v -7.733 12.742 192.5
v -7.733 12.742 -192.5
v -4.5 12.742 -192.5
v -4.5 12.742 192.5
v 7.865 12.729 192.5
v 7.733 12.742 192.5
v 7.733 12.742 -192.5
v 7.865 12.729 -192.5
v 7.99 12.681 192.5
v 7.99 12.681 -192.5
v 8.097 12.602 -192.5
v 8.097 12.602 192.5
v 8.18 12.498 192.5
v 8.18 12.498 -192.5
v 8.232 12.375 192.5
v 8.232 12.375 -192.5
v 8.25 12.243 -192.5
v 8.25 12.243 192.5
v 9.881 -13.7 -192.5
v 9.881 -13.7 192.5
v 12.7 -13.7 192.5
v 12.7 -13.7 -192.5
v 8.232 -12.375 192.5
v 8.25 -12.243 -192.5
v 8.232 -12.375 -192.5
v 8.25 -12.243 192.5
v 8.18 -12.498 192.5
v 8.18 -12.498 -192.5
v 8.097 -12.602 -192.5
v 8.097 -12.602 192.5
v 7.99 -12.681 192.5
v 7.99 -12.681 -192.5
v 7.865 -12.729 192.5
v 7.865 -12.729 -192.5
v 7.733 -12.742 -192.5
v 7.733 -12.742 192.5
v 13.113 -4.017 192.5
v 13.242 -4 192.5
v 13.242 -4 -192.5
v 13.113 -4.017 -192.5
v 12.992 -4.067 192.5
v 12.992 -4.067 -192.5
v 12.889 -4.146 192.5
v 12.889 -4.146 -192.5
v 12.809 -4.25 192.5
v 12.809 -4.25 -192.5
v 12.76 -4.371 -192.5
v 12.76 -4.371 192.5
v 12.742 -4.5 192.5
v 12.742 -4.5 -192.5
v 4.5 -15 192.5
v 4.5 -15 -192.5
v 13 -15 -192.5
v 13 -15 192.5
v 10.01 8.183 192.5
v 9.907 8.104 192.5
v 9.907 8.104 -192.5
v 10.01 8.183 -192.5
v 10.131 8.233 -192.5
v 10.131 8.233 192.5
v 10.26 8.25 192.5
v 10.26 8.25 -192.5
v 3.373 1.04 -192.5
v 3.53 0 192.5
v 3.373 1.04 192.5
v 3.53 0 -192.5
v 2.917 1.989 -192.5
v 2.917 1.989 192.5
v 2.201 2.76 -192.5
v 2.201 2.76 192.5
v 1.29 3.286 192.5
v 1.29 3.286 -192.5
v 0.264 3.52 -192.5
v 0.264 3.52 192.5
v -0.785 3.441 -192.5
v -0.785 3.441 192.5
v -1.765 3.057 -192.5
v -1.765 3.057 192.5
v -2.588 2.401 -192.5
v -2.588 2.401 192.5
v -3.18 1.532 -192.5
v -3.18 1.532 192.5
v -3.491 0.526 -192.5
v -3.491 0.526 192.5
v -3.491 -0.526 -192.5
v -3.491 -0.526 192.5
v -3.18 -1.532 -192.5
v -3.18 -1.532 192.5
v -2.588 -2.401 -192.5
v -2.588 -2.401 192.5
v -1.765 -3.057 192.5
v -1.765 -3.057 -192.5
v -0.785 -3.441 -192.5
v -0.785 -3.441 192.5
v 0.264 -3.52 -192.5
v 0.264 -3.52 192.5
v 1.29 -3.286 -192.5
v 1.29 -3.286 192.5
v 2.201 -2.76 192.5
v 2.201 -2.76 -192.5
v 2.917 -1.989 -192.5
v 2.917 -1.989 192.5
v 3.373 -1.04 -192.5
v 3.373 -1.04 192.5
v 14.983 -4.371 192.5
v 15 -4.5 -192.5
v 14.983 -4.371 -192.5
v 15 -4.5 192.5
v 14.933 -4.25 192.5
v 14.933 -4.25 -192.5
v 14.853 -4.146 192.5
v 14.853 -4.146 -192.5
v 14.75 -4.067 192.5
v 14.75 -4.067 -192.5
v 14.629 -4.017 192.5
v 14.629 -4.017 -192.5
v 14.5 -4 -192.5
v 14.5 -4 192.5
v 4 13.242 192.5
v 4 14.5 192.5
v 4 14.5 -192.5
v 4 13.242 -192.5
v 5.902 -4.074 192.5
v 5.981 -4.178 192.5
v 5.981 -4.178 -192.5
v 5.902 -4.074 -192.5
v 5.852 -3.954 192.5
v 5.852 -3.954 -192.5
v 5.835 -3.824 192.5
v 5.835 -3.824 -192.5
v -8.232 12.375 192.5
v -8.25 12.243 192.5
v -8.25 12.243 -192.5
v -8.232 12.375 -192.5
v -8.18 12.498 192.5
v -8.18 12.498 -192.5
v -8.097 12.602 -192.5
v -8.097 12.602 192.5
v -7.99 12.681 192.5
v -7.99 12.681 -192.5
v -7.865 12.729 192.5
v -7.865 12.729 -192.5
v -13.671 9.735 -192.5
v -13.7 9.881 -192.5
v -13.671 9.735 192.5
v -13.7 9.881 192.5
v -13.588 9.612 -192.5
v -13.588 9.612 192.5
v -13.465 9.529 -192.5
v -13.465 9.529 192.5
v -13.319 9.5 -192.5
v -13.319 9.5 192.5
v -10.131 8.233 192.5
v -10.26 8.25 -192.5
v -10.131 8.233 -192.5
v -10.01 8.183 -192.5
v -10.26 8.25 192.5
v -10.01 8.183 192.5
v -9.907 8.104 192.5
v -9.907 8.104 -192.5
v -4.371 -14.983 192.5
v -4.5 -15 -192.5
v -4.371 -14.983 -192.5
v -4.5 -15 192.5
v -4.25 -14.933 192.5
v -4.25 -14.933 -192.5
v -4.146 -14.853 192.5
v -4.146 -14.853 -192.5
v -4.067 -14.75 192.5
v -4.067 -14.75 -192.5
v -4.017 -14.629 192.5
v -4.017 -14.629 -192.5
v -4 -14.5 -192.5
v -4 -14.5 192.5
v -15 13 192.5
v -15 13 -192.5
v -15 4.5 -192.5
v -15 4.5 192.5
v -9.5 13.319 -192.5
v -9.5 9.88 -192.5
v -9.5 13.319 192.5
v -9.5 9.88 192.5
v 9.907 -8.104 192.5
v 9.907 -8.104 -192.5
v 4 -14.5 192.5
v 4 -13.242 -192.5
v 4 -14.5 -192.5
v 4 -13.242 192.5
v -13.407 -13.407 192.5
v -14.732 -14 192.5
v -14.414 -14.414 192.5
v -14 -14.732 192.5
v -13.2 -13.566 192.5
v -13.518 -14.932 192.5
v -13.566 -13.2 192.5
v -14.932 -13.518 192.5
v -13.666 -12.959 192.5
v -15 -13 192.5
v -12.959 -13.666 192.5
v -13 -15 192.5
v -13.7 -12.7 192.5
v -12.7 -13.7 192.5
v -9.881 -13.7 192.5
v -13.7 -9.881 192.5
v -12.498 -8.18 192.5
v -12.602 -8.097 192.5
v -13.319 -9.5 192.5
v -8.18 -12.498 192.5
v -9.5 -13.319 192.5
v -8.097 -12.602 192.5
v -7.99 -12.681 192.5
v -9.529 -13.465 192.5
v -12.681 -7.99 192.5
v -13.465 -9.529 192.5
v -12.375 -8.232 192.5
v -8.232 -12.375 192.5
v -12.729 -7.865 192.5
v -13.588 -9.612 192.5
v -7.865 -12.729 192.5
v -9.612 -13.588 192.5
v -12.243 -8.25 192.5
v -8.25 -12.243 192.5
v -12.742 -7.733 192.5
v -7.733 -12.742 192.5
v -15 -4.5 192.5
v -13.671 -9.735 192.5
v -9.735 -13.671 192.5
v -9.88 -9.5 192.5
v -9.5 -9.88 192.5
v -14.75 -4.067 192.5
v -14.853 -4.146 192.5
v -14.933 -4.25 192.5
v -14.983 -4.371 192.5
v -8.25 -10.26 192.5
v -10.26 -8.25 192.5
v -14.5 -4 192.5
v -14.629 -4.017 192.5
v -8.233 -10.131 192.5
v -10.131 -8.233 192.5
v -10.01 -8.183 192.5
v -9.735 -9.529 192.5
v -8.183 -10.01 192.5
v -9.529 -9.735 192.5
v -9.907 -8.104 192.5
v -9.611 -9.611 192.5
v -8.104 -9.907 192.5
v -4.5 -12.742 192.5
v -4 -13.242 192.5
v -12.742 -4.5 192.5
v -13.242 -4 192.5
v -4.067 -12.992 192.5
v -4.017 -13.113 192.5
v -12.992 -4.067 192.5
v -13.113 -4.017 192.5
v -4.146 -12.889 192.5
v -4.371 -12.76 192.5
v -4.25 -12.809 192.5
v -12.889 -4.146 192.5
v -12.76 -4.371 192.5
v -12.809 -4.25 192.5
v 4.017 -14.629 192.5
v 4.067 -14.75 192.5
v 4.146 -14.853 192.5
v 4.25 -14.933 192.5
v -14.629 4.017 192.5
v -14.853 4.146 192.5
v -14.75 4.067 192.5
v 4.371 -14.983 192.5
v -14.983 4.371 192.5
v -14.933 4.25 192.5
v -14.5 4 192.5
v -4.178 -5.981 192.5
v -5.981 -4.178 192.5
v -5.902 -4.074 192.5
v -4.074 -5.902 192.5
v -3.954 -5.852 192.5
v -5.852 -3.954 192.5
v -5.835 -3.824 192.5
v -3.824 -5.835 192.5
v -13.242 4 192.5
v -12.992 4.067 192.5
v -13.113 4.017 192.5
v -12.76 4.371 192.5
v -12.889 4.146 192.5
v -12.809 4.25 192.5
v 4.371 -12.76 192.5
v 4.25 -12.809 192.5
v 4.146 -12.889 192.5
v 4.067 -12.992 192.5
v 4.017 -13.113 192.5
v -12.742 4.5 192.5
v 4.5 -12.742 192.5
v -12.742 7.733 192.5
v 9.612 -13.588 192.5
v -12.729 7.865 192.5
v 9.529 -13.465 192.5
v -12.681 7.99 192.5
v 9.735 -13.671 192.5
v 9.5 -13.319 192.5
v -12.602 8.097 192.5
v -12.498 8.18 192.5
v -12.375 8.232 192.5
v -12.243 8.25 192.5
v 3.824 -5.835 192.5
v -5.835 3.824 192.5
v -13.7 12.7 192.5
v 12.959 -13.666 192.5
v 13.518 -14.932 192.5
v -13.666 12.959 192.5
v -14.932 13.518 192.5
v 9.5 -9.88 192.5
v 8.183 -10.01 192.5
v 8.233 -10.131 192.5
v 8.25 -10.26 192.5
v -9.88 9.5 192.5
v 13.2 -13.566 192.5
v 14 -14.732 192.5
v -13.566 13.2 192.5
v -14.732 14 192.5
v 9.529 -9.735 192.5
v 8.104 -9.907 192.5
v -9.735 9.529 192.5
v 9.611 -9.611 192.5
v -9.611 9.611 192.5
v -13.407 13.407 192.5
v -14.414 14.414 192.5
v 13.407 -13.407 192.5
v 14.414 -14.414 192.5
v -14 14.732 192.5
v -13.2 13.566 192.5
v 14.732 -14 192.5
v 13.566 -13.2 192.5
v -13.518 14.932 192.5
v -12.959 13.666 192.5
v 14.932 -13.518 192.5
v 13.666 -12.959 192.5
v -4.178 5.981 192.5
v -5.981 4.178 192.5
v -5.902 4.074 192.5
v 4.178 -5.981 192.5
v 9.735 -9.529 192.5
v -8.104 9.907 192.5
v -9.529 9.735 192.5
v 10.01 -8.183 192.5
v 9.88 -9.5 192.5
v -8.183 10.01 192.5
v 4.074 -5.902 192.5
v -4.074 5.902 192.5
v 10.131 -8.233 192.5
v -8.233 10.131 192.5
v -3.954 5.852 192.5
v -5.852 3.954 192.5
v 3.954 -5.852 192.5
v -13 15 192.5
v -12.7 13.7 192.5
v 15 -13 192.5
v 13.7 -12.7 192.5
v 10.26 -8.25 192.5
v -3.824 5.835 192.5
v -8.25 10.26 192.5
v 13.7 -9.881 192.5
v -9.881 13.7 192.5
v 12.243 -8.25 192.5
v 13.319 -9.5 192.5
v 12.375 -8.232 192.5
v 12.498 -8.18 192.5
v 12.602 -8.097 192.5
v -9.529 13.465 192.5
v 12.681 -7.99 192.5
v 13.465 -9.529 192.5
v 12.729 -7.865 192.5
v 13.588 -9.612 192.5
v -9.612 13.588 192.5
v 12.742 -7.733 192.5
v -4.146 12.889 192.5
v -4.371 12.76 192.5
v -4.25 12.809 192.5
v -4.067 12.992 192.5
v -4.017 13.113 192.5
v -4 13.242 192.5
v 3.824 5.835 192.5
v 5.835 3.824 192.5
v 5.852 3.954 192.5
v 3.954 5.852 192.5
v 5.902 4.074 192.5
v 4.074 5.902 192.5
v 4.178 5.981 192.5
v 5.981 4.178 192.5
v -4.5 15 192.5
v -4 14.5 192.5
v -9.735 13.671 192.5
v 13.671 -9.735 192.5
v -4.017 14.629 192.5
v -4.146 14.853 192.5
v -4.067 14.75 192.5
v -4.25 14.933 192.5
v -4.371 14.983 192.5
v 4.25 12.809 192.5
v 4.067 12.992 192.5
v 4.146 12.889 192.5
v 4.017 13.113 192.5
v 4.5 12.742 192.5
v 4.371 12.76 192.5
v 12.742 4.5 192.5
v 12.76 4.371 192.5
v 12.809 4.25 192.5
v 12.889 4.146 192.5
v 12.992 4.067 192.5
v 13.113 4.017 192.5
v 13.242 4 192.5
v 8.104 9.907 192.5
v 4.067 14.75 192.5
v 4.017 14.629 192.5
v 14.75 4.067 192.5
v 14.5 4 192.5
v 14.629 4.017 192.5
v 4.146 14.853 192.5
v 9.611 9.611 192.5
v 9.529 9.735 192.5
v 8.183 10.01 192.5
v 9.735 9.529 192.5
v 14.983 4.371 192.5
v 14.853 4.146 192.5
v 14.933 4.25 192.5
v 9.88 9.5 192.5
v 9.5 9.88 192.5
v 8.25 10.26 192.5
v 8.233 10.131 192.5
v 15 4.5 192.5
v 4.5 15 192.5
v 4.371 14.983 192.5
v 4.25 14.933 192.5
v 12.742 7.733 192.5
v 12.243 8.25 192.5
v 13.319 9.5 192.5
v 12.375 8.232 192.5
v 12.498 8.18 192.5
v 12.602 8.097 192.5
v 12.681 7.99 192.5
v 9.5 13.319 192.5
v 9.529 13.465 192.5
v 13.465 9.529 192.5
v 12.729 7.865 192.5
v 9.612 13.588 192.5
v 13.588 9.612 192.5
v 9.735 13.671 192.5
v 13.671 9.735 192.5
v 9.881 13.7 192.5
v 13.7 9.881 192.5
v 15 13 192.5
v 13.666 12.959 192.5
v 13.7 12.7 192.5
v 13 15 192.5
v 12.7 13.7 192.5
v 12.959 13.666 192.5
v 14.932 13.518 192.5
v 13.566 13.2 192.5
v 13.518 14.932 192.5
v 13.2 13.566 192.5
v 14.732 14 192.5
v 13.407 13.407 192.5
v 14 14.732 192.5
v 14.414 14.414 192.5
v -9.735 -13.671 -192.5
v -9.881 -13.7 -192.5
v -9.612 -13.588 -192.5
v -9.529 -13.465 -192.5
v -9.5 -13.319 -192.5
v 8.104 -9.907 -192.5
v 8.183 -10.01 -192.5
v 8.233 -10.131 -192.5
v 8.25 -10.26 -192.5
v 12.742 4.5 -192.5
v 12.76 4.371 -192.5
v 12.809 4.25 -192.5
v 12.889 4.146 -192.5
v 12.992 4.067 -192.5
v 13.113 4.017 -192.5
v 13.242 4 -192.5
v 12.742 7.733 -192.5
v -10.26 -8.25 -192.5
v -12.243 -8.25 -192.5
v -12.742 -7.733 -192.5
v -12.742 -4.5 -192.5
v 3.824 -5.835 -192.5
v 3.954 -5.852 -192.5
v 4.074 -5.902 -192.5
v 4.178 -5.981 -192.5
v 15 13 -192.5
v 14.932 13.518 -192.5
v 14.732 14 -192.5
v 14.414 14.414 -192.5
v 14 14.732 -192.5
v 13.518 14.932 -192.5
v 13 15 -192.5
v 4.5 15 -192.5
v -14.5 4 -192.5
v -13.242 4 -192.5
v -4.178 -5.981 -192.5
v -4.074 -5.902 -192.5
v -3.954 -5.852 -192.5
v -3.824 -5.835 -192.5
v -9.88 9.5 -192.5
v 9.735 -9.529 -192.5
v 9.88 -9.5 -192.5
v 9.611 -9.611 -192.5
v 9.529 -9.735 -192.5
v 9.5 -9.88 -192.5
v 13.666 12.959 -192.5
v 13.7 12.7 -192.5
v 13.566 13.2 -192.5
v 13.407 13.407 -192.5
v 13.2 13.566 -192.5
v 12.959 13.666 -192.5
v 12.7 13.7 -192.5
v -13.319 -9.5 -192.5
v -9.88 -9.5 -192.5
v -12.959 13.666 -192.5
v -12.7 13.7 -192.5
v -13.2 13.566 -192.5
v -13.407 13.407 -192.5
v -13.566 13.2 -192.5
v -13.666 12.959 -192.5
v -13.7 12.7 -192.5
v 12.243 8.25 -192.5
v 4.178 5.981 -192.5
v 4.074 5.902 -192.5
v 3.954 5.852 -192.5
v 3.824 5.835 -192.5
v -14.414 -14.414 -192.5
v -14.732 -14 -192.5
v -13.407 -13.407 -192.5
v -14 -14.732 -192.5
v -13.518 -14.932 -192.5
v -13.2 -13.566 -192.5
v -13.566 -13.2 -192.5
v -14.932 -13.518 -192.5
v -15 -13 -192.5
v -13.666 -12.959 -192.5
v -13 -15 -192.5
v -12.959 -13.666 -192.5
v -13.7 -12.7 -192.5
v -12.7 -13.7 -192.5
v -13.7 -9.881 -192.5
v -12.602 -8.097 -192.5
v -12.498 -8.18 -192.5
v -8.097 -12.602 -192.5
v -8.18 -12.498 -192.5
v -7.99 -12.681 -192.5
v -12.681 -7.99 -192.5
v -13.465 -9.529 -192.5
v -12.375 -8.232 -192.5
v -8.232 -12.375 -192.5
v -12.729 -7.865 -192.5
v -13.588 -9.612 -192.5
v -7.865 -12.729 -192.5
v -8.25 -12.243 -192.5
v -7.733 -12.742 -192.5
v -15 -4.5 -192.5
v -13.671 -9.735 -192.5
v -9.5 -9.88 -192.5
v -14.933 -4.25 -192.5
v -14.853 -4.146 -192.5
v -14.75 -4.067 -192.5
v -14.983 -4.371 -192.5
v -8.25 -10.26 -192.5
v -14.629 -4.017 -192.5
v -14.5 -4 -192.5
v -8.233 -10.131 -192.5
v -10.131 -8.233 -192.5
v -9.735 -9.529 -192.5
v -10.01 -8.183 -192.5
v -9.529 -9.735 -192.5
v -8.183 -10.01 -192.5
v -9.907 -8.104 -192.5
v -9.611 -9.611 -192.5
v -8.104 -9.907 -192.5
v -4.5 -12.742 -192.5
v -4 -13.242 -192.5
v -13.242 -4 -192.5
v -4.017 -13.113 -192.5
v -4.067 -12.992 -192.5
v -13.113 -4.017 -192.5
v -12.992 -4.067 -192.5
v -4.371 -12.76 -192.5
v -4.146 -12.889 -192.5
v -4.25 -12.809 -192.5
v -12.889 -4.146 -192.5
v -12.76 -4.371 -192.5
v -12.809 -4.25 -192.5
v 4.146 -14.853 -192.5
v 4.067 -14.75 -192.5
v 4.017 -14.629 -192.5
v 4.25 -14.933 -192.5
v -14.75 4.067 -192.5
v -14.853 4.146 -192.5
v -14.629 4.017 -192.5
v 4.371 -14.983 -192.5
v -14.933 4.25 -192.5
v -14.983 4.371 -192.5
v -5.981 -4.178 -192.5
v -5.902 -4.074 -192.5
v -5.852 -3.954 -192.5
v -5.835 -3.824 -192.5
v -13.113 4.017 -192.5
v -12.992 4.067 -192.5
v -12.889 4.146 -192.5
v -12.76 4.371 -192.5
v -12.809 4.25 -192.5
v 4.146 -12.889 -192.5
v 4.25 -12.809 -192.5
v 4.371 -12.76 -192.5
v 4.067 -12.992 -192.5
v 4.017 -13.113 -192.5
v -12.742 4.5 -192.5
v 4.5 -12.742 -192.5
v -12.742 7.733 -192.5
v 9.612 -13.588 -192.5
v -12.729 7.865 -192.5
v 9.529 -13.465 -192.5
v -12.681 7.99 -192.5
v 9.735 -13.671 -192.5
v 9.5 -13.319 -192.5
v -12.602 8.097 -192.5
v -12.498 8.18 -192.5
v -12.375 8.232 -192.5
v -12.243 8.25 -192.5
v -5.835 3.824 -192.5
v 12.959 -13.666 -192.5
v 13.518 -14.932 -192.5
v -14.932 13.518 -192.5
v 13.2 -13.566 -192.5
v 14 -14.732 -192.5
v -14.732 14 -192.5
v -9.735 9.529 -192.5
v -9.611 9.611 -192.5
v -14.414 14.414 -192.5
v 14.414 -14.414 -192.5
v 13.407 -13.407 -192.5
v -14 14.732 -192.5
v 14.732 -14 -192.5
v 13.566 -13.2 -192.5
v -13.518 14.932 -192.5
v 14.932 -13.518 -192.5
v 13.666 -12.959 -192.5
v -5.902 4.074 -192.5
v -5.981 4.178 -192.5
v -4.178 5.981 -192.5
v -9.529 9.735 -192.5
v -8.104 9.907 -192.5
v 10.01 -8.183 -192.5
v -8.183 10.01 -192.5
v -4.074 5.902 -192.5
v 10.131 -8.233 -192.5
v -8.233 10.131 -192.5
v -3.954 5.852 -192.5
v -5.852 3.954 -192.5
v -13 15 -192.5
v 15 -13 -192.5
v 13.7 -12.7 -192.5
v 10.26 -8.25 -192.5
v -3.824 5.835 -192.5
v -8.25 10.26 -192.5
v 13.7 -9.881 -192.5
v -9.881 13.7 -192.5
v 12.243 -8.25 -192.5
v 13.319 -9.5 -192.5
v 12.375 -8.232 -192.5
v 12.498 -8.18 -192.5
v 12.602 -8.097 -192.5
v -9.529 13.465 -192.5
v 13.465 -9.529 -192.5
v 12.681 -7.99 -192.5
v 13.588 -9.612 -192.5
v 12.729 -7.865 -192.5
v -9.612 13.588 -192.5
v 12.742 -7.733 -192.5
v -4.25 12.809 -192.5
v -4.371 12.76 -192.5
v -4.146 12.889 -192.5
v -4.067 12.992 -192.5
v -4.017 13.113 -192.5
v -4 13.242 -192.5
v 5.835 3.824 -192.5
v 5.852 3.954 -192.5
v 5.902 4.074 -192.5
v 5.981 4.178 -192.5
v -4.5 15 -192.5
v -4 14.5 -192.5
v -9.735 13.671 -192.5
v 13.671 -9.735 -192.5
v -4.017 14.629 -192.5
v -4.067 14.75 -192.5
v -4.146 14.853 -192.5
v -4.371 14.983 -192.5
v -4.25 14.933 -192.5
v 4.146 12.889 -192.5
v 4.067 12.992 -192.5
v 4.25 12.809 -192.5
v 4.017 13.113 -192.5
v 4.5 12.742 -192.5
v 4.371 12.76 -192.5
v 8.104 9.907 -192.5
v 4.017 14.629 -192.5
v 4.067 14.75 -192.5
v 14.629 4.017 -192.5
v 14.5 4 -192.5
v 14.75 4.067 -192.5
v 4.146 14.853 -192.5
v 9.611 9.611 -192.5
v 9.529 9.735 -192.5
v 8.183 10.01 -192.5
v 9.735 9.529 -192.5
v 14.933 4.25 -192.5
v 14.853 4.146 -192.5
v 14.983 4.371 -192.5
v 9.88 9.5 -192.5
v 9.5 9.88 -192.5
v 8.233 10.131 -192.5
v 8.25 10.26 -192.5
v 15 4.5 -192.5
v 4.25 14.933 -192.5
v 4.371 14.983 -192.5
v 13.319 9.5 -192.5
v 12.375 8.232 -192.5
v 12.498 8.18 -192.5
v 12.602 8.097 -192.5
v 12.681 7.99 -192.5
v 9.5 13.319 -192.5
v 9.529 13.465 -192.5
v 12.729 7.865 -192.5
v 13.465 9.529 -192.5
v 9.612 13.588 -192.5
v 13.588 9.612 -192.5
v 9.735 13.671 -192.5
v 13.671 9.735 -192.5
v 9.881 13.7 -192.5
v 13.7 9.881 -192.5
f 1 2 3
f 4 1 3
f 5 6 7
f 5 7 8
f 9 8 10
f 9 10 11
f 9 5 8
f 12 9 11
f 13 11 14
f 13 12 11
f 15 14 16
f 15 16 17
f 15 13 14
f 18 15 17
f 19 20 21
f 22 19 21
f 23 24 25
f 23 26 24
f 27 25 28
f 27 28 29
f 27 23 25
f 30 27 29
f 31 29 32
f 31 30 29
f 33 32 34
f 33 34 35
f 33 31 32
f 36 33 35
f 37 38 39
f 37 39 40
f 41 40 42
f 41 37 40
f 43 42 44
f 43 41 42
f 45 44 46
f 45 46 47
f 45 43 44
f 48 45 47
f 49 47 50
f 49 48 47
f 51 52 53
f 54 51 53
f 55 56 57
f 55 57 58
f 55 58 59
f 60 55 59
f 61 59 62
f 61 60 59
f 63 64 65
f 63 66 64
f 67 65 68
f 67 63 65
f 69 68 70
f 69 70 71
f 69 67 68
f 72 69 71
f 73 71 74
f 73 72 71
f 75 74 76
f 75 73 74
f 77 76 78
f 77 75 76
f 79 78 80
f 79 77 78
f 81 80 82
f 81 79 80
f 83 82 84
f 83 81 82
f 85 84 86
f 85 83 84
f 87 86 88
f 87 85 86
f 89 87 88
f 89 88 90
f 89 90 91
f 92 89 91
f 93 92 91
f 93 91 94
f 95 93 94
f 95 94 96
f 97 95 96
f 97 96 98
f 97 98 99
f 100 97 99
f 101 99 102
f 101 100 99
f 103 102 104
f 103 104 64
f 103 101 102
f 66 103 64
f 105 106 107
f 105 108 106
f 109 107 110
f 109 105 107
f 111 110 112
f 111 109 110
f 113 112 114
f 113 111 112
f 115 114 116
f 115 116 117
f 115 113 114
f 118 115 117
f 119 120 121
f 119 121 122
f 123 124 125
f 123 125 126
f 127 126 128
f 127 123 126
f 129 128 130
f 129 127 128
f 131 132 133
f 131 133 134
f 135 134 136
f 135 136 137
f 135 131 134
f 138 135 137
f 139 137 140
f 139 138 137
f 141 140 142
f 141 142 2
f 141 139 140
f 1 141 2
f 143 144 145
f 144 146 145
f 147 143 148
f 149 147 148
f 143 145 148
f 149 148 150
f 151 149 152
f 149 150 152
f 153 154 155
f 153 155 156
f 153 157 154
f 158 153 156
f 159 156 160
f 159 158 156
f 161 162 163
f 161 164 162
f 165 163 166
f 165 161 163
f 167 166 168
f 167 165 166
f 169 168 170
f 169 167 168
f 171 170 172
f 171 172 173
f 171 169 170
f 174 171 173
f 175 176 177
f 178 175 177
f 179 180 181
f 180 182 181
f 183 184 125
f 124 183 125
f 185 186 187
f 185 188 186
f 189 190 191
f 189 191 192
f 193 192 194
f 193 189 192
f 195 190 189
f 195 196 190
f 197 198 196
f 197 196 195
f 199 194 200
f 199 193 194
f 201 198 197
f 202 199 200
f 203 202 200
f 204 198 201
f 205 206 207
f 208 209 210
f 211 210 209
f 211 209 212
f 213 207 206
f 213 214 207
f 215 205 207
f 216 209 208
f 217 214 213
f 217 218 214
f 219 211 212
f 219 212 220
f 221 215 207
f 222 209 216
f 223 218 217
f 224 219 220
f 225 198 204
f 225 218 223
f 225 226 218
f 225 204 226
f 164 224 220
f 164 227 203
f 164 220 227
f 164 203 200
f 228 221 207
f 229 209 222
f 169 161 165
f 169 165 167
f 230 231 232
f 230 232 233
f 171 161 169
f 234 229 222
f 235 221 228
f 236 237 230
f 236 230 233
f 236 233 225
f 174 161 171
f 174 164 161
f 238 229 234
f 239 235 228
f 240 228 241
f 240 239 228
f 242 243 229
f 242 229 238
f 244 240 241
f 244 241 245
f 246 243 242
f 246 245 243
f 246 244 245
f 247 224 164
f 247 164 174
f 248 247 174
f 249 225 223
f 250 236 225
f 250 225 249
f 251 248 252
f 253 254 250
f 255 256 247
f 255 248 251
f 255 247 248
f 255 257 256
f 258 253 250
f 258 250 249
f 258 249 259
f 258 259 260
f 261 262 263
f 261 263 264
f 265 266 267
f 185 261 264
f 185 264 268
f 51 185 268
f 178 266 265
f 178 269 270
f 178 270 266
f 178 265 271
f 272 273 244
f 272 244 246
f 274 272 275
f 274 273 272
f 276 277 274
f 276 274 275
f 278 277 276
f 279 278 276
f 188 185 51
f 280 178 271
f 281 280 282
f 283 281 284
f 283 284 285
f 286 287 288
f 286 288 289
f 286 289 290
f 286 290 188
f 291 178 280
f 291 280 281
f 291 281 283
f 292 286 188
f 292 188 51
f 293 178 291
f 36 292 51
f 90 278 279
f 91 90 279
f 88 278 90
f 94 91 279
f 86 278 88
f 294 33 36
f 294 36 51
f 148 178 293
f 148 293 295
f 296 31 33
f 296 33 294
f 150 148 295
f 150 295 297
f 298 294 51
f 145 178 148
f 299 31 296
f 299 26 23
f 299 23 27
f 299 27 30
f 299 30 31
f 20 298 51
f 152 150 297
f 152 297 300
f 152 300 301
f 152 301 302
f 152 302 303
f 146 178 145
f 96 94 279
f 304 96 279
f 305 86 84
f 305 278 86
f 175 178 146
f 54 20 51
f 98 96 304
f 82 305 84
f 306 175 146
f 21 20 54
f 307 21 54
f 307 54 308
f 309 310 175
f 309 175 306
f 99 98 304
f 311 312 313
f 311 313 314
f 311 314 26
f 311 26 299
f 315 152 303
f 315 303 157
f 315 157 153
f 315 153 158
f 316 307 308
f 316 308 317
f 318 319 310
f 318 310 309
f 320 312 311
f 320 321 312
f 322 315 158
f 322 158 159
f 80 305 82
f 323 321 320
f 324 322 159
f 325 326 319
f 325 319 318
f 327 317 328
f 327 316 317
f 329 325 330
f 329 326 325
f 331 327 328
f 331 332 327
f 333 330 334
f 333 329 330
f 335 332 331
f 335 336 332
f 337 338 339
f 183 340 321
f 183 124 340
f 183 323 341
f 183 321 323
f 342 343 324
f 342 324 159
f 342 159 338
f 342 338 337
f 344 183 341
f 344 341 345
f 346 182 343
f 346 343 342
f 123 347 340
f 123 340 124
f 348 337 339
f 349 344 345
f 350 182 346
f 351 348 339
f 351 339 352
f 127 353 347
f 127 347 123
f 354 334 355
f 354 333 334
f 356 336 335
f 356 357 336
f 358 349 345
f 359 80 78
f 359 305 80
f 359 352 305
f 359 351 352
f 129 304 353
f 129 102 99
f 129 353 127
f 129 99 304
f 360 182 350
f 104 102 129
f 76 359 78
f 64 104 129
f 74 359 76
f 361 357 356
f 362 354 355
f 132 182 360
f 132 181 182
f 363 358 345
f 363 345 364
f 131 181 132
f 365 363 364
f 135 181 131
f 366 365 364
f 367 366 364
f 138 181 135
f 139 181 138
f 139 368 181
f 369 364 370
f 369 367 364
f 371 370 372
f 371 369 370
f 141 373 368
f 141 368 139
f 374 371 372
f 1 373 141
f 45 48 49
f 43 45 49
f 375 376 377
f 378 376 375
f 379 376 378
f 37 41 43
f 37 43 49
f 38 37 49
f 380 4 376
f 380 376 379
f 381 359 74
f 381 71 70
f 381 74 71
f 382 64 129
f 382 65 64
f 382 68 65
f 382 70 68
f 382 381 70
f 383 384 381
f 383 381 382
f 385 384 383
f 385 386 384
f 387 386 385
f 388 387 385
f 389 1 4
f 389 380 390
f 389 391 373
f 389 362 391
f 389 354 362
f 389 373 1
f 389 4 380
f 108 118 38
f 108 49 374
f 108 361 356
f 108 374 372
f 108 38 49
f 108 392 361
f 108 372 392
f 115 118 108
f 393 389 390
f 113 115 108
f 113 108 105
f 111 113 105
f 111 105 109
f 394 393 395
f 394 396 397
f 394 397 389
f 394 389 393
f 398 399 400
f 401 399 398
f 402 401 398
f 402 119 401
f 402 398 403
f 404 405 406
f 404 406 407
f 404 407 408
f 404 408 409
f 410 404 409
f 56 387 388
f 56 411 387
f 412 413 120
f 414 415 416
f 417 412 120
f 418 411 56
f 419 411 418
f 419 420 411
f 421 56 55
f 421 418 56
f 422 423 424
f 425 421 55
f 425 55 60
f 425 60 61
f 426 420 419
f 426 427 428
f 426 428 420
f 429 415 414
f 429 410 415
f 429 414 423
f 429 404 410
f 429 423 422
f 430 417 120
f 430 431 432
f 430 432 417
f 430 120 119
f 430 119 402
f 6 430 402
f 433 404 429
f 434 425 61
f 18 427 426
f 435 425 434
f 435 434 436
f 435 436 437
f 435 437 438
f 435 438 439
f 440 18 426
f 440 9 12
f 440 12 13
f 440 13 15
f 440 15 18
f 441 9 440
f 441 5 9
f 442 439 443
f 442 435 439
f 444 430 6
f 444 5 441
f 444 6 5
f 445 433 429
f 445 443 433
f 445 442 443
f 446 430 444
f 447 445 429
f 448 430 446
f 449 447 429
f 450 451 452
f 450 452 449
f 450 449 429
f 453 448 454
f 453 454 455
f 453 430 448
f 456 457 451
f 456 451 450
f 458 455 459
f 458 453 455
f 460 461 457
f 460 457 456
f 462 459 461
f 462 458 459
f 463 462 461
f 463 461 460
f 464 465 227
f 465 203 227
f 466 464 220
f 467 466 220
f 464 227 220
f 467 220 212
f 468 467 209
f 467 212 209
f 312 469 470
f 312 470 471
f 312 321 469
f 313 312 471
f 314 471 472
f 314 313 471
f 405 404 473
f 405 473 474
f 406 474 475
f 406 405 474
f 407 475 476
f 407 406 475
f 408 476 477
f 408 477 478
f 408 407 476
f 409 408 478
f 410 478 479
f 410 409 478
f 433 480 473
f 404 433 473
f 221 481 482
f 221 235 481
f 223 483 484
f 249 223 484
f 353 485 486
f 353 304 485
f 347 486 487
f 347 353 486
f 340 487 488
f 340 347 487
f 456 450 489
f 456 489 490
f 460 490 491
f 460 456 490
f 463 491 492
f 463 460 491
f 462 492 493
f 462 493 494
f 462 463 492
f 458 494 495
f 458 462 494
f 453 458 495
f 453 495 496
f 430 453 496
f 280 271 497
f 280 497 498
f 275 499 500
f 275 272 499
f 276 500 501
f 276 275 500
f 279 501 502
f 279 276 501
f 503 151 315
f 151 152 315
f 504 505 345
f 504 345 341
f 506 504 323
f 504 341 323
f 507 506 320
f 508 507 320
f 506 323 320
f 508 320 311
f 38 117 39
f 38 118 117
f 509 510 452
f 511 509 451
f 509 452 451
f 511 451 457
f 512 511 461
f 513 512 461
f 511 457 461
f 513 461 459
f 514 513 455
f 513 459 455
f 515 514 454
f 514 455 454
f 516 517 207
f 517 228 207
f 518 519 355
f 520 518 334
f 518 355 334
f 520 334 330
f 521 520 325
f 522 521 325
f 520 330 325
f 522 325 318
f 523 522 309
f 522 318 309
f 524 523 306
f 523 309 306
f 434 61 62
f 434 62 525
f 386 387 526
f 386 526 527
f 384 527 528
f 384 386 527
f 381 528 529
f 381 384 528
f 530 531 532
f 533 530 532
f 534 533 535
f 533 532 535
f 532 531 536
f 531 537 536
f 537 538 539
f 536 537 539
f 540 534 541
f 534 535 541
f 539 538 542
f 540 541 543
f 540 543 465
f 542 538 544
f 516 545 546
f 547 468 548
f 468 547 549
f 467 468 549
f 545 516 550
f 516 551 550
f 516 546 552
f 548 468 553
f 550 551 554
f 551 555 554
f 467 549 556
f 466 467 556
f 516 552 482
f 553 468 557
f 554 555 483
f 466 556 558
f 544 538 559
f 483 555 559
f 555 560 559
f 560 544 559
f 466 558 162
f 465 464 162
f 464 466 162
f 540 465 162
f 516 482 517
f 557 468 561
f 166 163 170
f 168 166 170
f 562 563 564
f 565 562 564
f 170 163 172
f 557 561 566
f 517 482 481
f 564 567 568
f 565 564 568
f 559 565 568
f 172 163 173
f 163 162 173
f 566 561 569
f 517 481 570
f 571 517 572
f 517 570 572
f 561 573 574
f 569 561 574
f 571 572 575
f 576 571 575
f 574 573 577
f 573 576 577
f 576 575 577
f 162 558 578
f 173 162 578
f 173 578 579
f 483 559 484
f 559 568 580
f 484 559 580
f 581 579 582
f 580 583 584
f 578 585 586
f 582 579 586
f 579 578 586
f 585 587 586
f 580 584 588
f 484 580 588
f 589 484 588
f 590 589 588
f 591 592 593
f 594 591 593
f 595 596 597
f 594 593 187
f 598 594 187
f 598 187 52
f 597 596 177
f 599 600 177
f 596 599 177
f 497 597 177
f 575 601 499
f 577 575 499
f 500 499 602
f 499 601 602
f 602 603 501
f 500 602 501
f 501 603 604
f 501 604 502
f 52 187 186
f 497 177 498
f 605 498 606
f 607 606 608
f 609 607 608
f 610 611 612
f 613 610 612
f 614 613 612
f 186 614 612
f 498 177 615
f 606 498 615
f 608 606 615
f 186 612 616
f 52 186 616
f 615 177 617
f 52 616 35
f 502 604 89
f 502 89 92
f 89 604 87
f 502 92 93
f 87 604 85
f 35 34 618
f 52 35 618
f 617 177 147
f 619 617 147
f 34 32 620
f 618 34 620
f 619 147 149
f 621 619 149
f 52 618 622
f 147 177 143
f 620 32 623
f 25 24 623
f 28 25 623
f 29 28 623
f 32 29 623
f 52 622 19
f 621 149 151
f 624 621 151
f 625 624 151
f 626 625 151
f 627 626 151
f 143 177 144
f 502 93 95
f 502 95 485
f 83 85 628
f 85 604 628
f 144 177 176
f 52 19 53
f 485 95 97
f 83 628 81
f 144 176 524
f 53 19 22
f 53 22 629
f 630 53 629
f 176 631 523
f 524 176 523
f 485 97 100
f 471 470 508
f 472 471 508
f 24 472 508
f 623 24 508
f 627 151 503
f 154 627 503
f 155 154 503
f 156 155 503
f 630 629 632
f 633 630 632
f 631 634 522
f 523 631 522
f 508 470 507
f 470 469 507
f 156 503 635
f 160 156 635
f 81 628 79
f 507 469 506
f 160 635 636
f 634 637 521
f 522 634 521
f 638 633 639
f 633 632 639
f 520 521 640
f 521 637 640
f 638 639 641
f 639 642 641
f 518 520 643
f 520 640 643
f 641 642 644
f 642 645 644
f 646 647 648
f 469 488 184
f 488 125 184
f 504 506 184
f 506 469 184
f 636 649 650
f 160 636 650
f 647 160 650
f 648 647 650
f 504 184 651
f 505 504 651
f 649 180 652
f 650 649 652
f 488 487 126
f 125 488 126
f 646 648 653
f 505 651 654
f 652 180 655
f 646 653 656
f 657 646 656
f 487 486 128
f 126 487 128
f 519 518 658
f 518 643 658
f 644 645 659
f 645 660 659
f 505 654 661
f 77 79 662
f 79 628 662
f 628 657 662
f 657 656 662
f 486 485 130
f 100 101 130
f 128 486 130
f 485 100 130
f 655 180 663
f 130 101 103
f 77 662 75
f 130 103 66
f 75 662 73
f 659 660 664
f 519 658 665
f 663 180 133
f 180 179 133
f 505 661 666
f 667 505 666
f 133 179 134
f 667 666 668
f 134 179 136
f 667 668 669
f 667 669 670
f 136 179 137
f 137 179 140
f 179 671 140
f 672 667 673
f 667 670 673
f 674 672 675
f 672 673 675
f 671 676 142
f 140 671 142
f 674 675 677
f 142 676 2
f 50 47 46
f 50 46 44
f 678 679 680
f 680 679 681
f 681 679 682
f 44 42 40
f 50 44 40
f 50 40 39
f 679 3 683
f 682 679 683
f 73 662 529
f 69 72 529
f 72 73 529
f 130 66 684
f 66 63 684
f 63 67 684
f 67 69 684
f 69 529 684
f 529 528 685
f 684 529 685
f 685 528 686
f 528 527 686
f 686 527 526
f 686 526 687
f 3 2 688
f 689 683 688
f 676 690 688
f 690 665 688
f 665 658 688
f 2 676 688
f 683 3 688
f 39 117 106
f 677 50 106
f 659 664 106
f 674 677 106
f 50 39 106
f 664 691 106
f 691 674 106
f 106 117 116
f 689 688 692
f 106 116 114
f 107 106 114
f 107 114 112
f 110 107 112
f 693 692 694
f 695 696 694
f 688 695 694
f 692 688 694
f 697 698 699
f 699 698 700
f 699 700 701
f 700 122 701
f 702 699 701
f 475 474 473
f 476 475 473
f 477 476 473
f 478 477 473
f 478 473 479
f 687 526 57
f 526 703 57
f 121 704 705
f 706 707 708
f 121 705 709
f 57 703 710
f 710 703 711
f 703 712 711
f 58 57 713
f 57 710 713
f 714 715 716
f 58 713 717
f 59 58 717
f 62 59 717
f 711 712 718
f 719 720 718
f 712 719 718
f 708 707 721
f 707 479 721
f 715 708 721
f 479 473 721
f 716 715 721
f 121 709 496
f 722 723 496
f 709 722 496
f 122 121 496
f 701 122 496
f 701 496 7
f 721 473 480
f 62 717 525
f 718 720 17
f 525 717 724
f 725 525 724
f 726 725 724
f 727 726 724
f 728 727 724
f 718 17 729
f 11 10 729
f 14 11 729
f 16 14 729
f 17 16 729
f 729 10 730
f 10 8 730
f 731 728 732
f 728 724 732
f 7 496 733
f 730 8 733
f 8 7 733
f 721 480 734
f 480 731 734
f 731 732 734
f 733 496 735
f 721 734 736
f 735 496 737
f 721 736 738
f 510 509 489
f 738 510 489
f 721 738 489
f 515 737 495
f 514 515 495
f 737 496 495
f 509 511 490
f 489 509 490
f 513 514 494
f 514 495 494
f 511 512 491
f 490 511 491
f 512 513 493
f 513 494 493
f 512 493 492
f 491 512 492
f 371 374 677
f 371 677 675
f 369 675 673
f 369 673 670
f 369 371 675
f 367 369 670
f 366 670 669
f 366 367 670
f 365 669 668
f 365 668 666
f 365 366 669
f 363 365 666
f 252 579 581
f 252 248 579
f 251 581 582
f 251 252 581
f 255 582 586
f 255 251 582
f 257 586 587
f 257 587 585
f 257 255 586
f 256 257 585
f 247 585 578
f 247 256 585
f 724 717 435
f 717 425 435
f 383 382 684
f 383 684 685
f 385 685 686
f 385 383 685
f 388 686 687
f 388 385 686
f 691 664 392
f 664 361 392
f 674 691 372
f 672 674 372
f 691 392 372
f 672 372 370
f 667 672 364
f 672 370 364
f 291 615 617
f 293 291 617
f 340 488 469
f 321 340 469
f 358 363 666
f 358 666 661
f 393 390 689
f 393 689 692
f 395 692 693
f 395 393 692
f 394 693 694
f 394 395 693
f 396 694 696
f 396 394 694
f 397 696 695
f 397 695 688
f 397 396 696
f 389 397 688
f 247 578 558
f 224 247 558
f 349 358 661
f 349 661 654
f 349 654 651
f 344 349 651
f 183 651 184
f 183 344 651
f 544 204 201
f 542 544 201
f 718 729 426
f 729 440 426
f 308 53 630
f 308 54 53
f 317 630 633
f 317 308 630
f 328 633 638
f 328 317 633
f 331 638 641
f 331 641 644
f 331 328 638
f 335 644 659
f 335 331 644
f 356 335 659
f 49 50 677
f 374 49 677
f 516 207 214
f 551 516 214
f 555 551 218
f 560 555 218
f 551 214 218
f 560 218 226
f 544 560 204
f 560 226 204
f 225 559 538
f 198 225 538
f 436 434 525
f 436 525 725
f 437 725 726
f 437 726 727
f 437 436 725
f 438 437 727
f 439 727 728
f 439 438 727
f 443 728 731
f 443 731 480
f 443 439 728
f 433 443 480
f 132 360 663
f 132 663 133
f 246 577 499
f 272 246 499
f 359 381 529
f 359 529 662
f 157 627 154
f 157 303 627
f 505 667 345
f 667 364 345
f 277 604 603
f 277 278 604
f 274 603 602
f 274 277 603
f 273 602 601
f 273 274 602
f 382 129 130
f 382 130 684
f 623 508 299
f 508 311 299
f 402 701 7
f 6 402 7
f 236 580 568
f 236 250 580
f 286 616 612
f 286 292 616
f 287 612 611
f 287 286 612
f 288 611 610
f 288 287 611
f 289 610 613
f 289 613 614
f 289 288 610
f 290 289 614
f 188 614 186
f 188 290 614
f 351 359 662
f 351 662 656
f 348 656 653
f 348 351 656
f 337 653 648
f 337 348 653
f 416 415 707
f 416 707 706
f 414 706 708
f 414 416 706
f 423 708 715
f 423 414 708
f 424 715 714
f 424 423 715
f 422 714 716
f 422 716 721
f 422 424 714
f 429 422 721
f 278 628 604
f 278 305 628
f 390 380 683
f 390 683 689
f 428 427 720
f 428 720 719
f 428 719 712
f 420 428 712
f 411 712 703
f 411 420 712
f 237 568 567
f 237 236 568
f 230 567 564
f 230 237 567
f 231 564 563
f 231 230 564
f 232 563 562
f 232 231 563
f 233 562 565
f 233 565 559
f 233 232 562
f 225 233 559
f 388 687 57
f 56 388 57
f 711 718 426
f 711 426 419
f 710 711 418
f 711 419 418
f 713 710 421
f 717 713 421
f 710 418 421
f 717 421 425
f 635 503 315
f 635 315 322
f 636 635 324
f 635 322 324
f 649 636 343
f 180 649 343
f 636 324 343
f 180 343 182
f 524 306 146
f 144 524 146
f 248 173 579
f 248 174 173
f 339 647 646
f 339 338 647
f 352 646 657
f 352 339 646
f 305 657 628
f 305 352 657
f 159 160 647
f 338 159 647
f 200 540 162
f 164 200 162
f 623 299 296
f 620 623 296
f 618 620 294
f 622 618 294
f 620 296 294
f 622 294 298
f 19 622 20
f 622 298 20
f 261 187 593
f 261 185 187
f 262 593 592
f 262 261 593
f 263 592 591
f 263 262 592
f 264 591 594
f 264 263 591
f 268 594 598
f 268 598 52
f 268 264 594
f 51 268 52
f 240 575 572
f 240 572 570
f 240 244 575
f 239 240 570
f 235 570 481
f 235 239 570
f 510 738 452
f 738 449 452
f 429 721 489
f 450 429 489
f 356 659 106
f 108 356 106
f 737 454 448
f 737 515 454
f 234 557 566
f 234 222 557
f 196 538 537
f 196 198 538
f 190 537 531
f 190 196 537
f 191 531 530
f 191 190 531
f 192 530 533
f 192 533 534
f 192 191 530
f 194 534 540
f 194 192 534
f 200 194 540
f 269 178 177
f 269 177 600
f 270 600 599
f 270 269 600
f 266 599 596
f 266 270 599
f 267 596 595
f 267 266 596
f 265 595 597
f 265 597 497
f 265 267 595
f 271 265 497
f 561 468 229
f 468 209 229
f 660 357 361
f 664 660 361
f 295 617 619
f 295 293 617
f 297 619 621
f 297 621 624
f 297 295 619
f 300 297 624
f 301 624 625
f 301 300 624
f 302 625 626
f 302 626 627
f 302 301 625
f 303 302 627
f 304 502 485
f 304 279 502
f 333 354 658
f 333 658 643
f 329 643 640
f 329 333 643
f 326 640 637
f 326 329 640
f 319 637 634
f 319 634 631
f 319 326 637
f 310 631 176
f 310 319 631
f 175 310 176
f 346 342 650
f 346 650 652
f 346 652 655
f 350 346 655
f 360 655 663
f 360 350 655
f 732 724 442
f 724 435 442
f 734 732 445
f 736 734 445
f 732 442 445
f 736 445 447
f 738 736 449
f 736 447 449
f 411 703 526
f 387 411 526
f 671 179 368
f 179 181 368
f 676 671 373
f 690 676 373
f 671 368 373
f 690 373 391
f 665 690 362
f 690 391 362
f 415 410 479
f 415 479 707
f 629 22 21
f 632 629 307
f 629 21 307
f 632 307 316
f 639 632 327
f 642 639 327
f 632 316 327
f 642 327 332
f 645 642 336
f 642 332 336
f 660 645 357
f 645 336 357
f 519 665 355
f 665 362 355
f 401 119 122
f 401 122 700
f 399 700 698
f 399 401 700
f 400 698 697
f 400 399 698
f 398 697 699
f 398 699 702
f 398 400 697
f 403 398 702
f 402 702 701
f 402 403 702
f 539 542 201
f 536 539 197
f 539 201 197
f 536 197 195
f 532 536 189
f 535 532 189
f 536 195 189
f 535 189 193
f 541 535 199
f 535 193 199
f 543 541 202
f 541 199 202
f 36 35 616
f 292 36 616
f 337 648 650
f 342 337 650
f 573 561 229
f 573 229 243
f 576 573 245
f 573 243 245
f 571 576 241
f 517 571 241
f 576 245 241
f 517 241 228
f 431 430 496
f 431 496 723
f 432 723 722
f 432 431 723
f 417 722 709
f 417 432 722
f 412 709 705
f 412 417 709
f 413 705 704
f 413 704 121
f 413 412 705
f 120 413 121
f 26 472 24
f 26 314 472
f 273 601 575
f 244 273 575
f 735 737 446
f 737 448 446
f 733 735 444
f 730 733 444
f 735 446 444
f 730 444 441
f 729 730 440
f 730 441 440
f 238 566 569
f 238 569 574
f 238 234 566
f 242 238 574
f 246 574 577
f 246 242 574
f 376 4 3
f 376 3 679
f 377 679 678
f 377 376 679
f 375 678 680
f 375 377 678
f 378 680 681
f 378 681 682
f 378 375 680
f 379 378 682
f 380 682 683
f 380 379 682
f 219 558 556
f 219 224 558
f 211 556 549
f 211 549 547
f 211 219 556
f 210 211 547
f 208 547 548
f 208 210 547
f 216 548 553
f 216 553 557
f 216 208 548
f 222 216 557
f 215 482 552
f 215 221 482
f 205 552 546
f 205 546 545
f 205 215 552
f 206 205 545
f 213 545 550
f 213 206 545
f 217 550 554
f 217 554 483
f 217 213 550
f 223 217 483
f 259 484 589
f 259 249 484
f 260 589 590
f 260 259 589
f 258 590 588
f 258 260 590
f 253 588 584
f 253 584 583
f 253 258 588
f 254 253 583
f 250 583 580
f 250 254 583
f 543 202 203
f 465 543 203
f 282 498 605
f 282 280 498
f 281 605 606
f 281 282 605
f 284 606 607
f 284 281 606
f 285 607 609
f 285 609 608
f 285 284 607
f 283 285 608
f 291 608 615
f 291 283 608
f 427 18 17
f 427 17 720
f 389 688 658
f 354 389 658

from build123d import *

# Parameters (mm, degrees)
SKETCH1_R           = 3.52998588
BOSS_EXTRUDE1_DEPTH = 192.5


with BuildPart() as part:
    # Sketch1 → Boss-Extrude1 (new body, symmetric)
    with BuildSketch(Plane.XY):
        with BuildLine():
            Line((14.49994, -4), (13.24247465, -4))
            ThreePointArc((13.24247465, -4), (12.88892126, -4.146446609), (12.74247465, -4.5))
            Line((12.74247465, -4.5), (12.74247465, -7.732519321))
            ThreePointArc((12.74247465, -7.732519321), (12.602449697, -8.097296796), (12.242781236, -8.249967))
            Line((12.242781236, -8.249967), (10.260188032, -8.249967))
            ThreePointArc((10.260188032, -8.249967), (10.068847082, -8.211906919), (9.906636056, -8.103520976))
            Line((9.906636056, -8.103520976), (5.981117769, -4.178002689))
            ThreePointArc((5.981117769, -4.178002689), (5.872731827, -4.015791664), (5.834671745, -3.824450713))
            Line((5.834671745, -3.824450713), (5.834671745, -1.01249595))
            Line((5.834671745, -1.01249595), (5.834671745, 0.88749645))
            Line((5.834671745, 0.88749645), (5.834671745, 3.824450713))
            ThreePointArc((5.834671745, 3.824450713), (5.872731827, 4.015791664), (5.981117769, 4.178002689))
            Line((5.981117769, 4.178002689), (9.906636056, 8.103520976))
            ThreePointArc((9.906636056, 8.103520976), (10.068847082, 8.211906919), (10.260188032, 8.249967))
            Line((10.260188032, 8.249967), (12.242781236, 8.249967))
            ThreePointArc((12.242781236, 8.249967), (12.602449697, 8.097296796), (12.74247465, 7.732519321))
            Line((12.74247465, 7.732519321), (12.74247465, 4.5))
            ThreePointArc((12.74247465, 4.5), (12.88892126, 4.146446609), (13.24247465, 4))
            Line((13.24247465, 4), (14.49994, 4))
            ThreePointArc((14.49994, 4), (14.853493391, 4.146446609), (14.99994, 4.5))
            Line((14.99994, 4.5), (14.99994, 12.999948))
            ThreePointArc((14.99994, 12.999948), (14.414155906, 14.414155906), (12.999948, 14.99994))
            Line((12.999948, 14.99994), (4.5, 14.99994))
            ThreePointArc((4.5, 14.99994), (4.146446609, 14.853493391), (4, 14.49994))
            Line((4, 14.49994), (4, 13.24247465))
            ThreePointArc((4, 13.24247465), (4.146446609, 12.88892126), (4.5, 12.74247465))
            Line((4.5, 12.74247465), (7.732519321, 12.74247465))
            ThreePointArc((7.732519321, 12.74247465), (8.097296796, 12.602449697), (8.249967, 12.242781236))
            Line((8.249967, 12.242781236), (8.249967, 10.260188032))
            ThreePointArc((8.249967, 10.260188032), (8.211906919, 10.068847082), (8.103520976, 9.906636056))
            Line((8.103520976, 9.906636056), (4.178002689, 5.981117769))
            ThreePointArc((4.178002689, 5.981117769), (4.015791664, 5.872731827), (3.824450713, 5.834671745))
            Line((3.824450713, 5.834671745), (0.9499962, 5.834671745))
            Line((0.9499962, 5.834671745), (-0.9499962, 5.834671745))
            Line((-0.9499962, 5.834671745), (-3.824450713, 5.834671745))
            ThreePointArc((-3.824450713, 5.834671745), (-4.015791664, 5.872731827), (-4.178002689, 5.981117769))
            Line((-4.178002689, 5.981117769), (-8.103520976, 9.906636056))
            ThreePointArc((-8.103520976, 9.906636056), (-8.211906919, 10.068847082), (-8.249967, 10.260188032))
            Line((-8.249967, 10.260188032), (-8.249967, 12.242781236))
            ThreePointArc((-8.249967, 12.242781236), (-8.097296796, 12.602449697), (-7.732519321, 12.74247465))
            Line((-7.732519321, 12.74247465), (-4.5, 12.74247465))
            ThreePointArc((-4.5, 12.74247465), (-4.146446609, 12.88892126), (-4, 13.24247465))
            Line((-4, 13.24247465), (-4, 14.49994))
            ThreePointArc((-4, 14.49994), (-4.146446609, 14.853493391), (-4.5, 14.99994))
            Line((-4.5, 14.99994), (-12.999948, 14.99994))
            ThreePointArc((-12.999948, 14.99994), (-14.414155906, 14.414155906), (-14.99994, 12.999948))
            Line((-14.99994, 12.999948), (-14.99994, 4.5))
            ThreePointArc((-14.99994, 4.5), (-14.853493391, 4.146446609), (-14.49994, 4))
            Line((-14.49994, 4), (-13.24247465, 4))
            ThreePointArc((-13.24247465, 4), (-12.88892126, 4.146446609), (-12.74247465, 4.5))
            Line((-12.74247465, 4.5), (-12.74247465, 7.732519321))
            ThreePointArc((-12.74247465, 7.732519321), (-12.602449697, 8.097296796), (-12.242781236, 8.249967))
            Line((-12.242781236, 8.249967), (-10.260188032, 8.249967))
            ThreePointArc((-10.260188032, 8.249967), (-10.068847082, 8.211906919), (-9.906636056, 8.103520976))
            Line((-9.906636056, 8.103520976), (-5.981117769, 4.178002689))
            ThreePointArc((-5.981117769, 4.178002689), (-5.872731827, 4.015791664), (-5.834671745, 3.824450713))
            Line((-5.834671745, 3.824450713), (-5.834671745, 0.88749645))
            Line((-5.834671745, 0.88749645), (-5.834671745, -1.01249595))
            Line((-5.834671745, -1.01249595), (-5.834671745, -3.824450713))
            ThreePointArc((-5.834671745, -3.824450713), (-5.872731827, -4.015791664), (-5.981117769, -4.178002689))
            Line((-5.981117769, -4.178002689), (-9.906636056, -8.103520976))
            ThreePointArc((-9.906636056, -8.103520976), (-10.068847082, -8.211906919), (-10.260188032, -8.249967))
            Line((-10.260188032, -8.249967), (-12.242781236, -8.249967))
            ThreePointArc((-12.242781236, -8.249967), (-12.602449697, -8.097296796), (-12.74247465, -7.732519321))
            Line((-12.74247465, -7.732519321), (-12.74247465, -4.5))
            ThreePointArc((-12.74247465, -4.5), (-12.88892126, -4.146446609), (-13.24247465, -4))
            Line((-13.24247465, -4), (-14.49994, -4))
            ThreePointArc((-14.49994, -4), (-14.853493391, -4.146446609), (-14.99994, -4.5))
            Line((-14.99994, -4.5), (-14.99994, -12.999948))
            ThreePointArc((-14.99994, -12.999948), (-14.414155906, -14.414155906), (-12.999948, -14.99994))
            Line((-12.999948, -14.99994), (-4.5, -14.99994))
            ThreePointArc((-4.5, -14.99994), (-4.146446609, -14.853493391), (-4, -14.49994))
            Line((-4, -14.49994), (-4, -13.24247465))
            ThreePointArc((-4, -13.24247465), (-4.146446609, -12.88892126), (-4.5, -12.74247465))
            Line((-4.5, -12.74247465), (-7.732519321, -12.74247465))
            ThreePointArc((-7.732519321, -12.74247465), (-8.097296796, -12.602449697), (-8.249967, -12.242781236))
            Line((-8.249967, -12.242781236), (-8.249967, -10.260188032))
            ThreePointArc((-8.249967, -10.260188032), (-8.211906919, -10.068847082), (-8.103520976, -9.906636056))
            Line((-8.103520976, -9.906636056), (-4.178002689, -5.981117769))
            ThreePointArc((-4.178002689, -5.981117769), (-4.015791664, -5.872731827), (-3.824450713, -5.834671745))
            Line((-3.824450713, -5.834671745), (-0.9499962, -5.834671745))
            Line((-0.9499962, -5.834671745), (0.9499962, -5.834671745))
            Line((0.9499962, -5.834671745), (3.824450713, -5.834671745))
            ThreePointArc((3.824450713, -5.834671745), (4.015791664, -5.872731827), (4.178002689, -5.981117769))
            Line((4.178002689, -5.981117769), (8.103520976, -9.906636056))
            ThreePointArc((8.103520976, -9.906636056), (8.211906919, -10.068847082), (8.249967, -10.260188032))
            Line((8.249967, -10.260188032), (8.249967, -12.242781236))
            ThreePointArc((8.249967, -12.242781236), (8.097296796, -12.602449697), (7.732519321, -12.74247465))
            Line((7.732519321, -12.74247465), (4.5, -12.74247465))
            ThreePointArc((4.5, -12.74247465), (4.146446609, -12.88892126), (4, -13.24247465))
            Line((4, -13.24247465), (4, -14.49994))
            ThreePointArc((4, -14.49994), (4.146446609, -14.853493391), (4.5, -14.99994))
            Line((4.5, -14.99994), (12.999948, -14.99994))
            ThreePointArc((12.999948, -14.99994), (14.414155906, -14.414155906), (14.99994, -12.999948))
            Line((14.99994, -12.999948), (14.99994, -4.5))
            ThreePointArc((14.99994, -4.5), (14.853493391, -4.146446609), (14.49994, -4))
        make_face()
        Circle(SKETCH1_R, mode=Mode.SUBTRACT)
        with BuildLine():
            Line((-12.6999492, -13.6999452), (-9.880960476, -13.6999452))
            ThreePointArc((-9.880960476, -13.6999452), (-9.61155387, -13.58835333), (-9.499962, -13.318946724))
            Line((-9.499962, -13.318946724), (-9.499962, -9.87996048))
            ThreePointArc((-9.499962, -9.87996048), (-9.611260978, -9.611260978), (-9.87996048, -9.499962))
            Line((-9.87996048, -9.499962), (-13.318946724, -9.499962))
            ThreePointArc((-13.318946724, -9.499962), (-13.58835333, -9.61155387), (-13.6999452, -9.880960476))
            Line((-13.6999452, -9.880960476), (-13.6999452, -12.6999492))
            ThreePointArc((-13.6999452, -12.6999492), (-13.407053153, -13.407053153), (-12.6999492, -13.6999452))
        make_face(mode=Mode.SUBTRACT)
        with BuildLine():
            Line((13.6999452, -12.6999492), (13.6999452, -9.880960476))
            ThreePointArc((13.6999452, -9.880960476), (13.58835333, -9.61155387), (13.318946724, -9.499962))
            Line((13.318946724, -9.499962), (9.87996048, -9.499962))
            ThreePointArc((9.87996048, -9.499962), (9.611260978, -9.611260978), (9.499962, -9.87996048))
            Line((9.499962, -9.87996048), (9.499962, -13.318946724))
            ThreePointArc((9.499962, -13.318946724), (9.61155387, -13.58835333), (9.880960476, -13.6999452))
            Line((9.880960476, -13.6999452), (12.6999492, -13.6999452))
            ThreePointArc((12.6999492, -13.6999452), (13.407053153, -13.407053153), (13.6999452, -12.6999492))
        make_face(mode=Mode.SUBTRACT)
        with BuildLine():
            Line((9.87996048, 9.499962), (13.318946724, 9.499962))
            ThreePointArc((13.318946724, 9.499962), (13.58835333, 9.61155387), (13.6999452, 9.880960476))
            Line((13.6999452, 9.880960476), (13.6999452, 12.6999492))
            ThreePointArc((13.6999452, 12.6999492), (13.407053153, 13.407053153), (12.6999492, 13.6999452))
            Line((12.6999492, 13.6999452), (9.880960476, 13.6999452))
            ThreePointArc((9.880960476, 13.6999452), (9.61155387, 13.58835333), (9.499962, 13.318946724))
            Line((9.499962, 13.318946724), (9.499962, 9.87996048))
            ThreePointArc((9.499962, 9.87996048), (9.611260978, 9.611260978), (9.87996048, 9.499962))
        make_face(mode=Mode.SUBTRACT)
        with BuildLine():
            Line((-13.6999452, 12.6999492), (-13.6999452, 9.880960476))
            ThreePointArc((-13.6999452, 9.880960476), (-13.58835333, 9.61155387), (-13.318946724, 9.499962))
            Line((-13.318946724, 9.499962), (-9.87996048, 9.499962))
            ThreePointArc((-9.87996048, 9.499962), (-9.611260978, 9.611260978), (-9.499962, 9.87996048))
            Line((-9.499962, 9.87996048), (-9.499962, 13.318946724))
            ThreePointArc((-9.499962, 13.318946724), (-9.61155387, 13.58835333), (-9.880960476, 13.6999452))
            Line((-9.880960476, 13.6999452), (-12.6999492, 13.6999452))
            ThreePointArc((-12.6999492, 13.6999452), (-13.407053153, 13.407053153), (-13.6999452, 12.6999492))
        make_face(mode=Mode.SUBTRACT)
    extrude(amount=BOSS_EXTRUDE1_DEPTH, both=True)


solid = part.part
